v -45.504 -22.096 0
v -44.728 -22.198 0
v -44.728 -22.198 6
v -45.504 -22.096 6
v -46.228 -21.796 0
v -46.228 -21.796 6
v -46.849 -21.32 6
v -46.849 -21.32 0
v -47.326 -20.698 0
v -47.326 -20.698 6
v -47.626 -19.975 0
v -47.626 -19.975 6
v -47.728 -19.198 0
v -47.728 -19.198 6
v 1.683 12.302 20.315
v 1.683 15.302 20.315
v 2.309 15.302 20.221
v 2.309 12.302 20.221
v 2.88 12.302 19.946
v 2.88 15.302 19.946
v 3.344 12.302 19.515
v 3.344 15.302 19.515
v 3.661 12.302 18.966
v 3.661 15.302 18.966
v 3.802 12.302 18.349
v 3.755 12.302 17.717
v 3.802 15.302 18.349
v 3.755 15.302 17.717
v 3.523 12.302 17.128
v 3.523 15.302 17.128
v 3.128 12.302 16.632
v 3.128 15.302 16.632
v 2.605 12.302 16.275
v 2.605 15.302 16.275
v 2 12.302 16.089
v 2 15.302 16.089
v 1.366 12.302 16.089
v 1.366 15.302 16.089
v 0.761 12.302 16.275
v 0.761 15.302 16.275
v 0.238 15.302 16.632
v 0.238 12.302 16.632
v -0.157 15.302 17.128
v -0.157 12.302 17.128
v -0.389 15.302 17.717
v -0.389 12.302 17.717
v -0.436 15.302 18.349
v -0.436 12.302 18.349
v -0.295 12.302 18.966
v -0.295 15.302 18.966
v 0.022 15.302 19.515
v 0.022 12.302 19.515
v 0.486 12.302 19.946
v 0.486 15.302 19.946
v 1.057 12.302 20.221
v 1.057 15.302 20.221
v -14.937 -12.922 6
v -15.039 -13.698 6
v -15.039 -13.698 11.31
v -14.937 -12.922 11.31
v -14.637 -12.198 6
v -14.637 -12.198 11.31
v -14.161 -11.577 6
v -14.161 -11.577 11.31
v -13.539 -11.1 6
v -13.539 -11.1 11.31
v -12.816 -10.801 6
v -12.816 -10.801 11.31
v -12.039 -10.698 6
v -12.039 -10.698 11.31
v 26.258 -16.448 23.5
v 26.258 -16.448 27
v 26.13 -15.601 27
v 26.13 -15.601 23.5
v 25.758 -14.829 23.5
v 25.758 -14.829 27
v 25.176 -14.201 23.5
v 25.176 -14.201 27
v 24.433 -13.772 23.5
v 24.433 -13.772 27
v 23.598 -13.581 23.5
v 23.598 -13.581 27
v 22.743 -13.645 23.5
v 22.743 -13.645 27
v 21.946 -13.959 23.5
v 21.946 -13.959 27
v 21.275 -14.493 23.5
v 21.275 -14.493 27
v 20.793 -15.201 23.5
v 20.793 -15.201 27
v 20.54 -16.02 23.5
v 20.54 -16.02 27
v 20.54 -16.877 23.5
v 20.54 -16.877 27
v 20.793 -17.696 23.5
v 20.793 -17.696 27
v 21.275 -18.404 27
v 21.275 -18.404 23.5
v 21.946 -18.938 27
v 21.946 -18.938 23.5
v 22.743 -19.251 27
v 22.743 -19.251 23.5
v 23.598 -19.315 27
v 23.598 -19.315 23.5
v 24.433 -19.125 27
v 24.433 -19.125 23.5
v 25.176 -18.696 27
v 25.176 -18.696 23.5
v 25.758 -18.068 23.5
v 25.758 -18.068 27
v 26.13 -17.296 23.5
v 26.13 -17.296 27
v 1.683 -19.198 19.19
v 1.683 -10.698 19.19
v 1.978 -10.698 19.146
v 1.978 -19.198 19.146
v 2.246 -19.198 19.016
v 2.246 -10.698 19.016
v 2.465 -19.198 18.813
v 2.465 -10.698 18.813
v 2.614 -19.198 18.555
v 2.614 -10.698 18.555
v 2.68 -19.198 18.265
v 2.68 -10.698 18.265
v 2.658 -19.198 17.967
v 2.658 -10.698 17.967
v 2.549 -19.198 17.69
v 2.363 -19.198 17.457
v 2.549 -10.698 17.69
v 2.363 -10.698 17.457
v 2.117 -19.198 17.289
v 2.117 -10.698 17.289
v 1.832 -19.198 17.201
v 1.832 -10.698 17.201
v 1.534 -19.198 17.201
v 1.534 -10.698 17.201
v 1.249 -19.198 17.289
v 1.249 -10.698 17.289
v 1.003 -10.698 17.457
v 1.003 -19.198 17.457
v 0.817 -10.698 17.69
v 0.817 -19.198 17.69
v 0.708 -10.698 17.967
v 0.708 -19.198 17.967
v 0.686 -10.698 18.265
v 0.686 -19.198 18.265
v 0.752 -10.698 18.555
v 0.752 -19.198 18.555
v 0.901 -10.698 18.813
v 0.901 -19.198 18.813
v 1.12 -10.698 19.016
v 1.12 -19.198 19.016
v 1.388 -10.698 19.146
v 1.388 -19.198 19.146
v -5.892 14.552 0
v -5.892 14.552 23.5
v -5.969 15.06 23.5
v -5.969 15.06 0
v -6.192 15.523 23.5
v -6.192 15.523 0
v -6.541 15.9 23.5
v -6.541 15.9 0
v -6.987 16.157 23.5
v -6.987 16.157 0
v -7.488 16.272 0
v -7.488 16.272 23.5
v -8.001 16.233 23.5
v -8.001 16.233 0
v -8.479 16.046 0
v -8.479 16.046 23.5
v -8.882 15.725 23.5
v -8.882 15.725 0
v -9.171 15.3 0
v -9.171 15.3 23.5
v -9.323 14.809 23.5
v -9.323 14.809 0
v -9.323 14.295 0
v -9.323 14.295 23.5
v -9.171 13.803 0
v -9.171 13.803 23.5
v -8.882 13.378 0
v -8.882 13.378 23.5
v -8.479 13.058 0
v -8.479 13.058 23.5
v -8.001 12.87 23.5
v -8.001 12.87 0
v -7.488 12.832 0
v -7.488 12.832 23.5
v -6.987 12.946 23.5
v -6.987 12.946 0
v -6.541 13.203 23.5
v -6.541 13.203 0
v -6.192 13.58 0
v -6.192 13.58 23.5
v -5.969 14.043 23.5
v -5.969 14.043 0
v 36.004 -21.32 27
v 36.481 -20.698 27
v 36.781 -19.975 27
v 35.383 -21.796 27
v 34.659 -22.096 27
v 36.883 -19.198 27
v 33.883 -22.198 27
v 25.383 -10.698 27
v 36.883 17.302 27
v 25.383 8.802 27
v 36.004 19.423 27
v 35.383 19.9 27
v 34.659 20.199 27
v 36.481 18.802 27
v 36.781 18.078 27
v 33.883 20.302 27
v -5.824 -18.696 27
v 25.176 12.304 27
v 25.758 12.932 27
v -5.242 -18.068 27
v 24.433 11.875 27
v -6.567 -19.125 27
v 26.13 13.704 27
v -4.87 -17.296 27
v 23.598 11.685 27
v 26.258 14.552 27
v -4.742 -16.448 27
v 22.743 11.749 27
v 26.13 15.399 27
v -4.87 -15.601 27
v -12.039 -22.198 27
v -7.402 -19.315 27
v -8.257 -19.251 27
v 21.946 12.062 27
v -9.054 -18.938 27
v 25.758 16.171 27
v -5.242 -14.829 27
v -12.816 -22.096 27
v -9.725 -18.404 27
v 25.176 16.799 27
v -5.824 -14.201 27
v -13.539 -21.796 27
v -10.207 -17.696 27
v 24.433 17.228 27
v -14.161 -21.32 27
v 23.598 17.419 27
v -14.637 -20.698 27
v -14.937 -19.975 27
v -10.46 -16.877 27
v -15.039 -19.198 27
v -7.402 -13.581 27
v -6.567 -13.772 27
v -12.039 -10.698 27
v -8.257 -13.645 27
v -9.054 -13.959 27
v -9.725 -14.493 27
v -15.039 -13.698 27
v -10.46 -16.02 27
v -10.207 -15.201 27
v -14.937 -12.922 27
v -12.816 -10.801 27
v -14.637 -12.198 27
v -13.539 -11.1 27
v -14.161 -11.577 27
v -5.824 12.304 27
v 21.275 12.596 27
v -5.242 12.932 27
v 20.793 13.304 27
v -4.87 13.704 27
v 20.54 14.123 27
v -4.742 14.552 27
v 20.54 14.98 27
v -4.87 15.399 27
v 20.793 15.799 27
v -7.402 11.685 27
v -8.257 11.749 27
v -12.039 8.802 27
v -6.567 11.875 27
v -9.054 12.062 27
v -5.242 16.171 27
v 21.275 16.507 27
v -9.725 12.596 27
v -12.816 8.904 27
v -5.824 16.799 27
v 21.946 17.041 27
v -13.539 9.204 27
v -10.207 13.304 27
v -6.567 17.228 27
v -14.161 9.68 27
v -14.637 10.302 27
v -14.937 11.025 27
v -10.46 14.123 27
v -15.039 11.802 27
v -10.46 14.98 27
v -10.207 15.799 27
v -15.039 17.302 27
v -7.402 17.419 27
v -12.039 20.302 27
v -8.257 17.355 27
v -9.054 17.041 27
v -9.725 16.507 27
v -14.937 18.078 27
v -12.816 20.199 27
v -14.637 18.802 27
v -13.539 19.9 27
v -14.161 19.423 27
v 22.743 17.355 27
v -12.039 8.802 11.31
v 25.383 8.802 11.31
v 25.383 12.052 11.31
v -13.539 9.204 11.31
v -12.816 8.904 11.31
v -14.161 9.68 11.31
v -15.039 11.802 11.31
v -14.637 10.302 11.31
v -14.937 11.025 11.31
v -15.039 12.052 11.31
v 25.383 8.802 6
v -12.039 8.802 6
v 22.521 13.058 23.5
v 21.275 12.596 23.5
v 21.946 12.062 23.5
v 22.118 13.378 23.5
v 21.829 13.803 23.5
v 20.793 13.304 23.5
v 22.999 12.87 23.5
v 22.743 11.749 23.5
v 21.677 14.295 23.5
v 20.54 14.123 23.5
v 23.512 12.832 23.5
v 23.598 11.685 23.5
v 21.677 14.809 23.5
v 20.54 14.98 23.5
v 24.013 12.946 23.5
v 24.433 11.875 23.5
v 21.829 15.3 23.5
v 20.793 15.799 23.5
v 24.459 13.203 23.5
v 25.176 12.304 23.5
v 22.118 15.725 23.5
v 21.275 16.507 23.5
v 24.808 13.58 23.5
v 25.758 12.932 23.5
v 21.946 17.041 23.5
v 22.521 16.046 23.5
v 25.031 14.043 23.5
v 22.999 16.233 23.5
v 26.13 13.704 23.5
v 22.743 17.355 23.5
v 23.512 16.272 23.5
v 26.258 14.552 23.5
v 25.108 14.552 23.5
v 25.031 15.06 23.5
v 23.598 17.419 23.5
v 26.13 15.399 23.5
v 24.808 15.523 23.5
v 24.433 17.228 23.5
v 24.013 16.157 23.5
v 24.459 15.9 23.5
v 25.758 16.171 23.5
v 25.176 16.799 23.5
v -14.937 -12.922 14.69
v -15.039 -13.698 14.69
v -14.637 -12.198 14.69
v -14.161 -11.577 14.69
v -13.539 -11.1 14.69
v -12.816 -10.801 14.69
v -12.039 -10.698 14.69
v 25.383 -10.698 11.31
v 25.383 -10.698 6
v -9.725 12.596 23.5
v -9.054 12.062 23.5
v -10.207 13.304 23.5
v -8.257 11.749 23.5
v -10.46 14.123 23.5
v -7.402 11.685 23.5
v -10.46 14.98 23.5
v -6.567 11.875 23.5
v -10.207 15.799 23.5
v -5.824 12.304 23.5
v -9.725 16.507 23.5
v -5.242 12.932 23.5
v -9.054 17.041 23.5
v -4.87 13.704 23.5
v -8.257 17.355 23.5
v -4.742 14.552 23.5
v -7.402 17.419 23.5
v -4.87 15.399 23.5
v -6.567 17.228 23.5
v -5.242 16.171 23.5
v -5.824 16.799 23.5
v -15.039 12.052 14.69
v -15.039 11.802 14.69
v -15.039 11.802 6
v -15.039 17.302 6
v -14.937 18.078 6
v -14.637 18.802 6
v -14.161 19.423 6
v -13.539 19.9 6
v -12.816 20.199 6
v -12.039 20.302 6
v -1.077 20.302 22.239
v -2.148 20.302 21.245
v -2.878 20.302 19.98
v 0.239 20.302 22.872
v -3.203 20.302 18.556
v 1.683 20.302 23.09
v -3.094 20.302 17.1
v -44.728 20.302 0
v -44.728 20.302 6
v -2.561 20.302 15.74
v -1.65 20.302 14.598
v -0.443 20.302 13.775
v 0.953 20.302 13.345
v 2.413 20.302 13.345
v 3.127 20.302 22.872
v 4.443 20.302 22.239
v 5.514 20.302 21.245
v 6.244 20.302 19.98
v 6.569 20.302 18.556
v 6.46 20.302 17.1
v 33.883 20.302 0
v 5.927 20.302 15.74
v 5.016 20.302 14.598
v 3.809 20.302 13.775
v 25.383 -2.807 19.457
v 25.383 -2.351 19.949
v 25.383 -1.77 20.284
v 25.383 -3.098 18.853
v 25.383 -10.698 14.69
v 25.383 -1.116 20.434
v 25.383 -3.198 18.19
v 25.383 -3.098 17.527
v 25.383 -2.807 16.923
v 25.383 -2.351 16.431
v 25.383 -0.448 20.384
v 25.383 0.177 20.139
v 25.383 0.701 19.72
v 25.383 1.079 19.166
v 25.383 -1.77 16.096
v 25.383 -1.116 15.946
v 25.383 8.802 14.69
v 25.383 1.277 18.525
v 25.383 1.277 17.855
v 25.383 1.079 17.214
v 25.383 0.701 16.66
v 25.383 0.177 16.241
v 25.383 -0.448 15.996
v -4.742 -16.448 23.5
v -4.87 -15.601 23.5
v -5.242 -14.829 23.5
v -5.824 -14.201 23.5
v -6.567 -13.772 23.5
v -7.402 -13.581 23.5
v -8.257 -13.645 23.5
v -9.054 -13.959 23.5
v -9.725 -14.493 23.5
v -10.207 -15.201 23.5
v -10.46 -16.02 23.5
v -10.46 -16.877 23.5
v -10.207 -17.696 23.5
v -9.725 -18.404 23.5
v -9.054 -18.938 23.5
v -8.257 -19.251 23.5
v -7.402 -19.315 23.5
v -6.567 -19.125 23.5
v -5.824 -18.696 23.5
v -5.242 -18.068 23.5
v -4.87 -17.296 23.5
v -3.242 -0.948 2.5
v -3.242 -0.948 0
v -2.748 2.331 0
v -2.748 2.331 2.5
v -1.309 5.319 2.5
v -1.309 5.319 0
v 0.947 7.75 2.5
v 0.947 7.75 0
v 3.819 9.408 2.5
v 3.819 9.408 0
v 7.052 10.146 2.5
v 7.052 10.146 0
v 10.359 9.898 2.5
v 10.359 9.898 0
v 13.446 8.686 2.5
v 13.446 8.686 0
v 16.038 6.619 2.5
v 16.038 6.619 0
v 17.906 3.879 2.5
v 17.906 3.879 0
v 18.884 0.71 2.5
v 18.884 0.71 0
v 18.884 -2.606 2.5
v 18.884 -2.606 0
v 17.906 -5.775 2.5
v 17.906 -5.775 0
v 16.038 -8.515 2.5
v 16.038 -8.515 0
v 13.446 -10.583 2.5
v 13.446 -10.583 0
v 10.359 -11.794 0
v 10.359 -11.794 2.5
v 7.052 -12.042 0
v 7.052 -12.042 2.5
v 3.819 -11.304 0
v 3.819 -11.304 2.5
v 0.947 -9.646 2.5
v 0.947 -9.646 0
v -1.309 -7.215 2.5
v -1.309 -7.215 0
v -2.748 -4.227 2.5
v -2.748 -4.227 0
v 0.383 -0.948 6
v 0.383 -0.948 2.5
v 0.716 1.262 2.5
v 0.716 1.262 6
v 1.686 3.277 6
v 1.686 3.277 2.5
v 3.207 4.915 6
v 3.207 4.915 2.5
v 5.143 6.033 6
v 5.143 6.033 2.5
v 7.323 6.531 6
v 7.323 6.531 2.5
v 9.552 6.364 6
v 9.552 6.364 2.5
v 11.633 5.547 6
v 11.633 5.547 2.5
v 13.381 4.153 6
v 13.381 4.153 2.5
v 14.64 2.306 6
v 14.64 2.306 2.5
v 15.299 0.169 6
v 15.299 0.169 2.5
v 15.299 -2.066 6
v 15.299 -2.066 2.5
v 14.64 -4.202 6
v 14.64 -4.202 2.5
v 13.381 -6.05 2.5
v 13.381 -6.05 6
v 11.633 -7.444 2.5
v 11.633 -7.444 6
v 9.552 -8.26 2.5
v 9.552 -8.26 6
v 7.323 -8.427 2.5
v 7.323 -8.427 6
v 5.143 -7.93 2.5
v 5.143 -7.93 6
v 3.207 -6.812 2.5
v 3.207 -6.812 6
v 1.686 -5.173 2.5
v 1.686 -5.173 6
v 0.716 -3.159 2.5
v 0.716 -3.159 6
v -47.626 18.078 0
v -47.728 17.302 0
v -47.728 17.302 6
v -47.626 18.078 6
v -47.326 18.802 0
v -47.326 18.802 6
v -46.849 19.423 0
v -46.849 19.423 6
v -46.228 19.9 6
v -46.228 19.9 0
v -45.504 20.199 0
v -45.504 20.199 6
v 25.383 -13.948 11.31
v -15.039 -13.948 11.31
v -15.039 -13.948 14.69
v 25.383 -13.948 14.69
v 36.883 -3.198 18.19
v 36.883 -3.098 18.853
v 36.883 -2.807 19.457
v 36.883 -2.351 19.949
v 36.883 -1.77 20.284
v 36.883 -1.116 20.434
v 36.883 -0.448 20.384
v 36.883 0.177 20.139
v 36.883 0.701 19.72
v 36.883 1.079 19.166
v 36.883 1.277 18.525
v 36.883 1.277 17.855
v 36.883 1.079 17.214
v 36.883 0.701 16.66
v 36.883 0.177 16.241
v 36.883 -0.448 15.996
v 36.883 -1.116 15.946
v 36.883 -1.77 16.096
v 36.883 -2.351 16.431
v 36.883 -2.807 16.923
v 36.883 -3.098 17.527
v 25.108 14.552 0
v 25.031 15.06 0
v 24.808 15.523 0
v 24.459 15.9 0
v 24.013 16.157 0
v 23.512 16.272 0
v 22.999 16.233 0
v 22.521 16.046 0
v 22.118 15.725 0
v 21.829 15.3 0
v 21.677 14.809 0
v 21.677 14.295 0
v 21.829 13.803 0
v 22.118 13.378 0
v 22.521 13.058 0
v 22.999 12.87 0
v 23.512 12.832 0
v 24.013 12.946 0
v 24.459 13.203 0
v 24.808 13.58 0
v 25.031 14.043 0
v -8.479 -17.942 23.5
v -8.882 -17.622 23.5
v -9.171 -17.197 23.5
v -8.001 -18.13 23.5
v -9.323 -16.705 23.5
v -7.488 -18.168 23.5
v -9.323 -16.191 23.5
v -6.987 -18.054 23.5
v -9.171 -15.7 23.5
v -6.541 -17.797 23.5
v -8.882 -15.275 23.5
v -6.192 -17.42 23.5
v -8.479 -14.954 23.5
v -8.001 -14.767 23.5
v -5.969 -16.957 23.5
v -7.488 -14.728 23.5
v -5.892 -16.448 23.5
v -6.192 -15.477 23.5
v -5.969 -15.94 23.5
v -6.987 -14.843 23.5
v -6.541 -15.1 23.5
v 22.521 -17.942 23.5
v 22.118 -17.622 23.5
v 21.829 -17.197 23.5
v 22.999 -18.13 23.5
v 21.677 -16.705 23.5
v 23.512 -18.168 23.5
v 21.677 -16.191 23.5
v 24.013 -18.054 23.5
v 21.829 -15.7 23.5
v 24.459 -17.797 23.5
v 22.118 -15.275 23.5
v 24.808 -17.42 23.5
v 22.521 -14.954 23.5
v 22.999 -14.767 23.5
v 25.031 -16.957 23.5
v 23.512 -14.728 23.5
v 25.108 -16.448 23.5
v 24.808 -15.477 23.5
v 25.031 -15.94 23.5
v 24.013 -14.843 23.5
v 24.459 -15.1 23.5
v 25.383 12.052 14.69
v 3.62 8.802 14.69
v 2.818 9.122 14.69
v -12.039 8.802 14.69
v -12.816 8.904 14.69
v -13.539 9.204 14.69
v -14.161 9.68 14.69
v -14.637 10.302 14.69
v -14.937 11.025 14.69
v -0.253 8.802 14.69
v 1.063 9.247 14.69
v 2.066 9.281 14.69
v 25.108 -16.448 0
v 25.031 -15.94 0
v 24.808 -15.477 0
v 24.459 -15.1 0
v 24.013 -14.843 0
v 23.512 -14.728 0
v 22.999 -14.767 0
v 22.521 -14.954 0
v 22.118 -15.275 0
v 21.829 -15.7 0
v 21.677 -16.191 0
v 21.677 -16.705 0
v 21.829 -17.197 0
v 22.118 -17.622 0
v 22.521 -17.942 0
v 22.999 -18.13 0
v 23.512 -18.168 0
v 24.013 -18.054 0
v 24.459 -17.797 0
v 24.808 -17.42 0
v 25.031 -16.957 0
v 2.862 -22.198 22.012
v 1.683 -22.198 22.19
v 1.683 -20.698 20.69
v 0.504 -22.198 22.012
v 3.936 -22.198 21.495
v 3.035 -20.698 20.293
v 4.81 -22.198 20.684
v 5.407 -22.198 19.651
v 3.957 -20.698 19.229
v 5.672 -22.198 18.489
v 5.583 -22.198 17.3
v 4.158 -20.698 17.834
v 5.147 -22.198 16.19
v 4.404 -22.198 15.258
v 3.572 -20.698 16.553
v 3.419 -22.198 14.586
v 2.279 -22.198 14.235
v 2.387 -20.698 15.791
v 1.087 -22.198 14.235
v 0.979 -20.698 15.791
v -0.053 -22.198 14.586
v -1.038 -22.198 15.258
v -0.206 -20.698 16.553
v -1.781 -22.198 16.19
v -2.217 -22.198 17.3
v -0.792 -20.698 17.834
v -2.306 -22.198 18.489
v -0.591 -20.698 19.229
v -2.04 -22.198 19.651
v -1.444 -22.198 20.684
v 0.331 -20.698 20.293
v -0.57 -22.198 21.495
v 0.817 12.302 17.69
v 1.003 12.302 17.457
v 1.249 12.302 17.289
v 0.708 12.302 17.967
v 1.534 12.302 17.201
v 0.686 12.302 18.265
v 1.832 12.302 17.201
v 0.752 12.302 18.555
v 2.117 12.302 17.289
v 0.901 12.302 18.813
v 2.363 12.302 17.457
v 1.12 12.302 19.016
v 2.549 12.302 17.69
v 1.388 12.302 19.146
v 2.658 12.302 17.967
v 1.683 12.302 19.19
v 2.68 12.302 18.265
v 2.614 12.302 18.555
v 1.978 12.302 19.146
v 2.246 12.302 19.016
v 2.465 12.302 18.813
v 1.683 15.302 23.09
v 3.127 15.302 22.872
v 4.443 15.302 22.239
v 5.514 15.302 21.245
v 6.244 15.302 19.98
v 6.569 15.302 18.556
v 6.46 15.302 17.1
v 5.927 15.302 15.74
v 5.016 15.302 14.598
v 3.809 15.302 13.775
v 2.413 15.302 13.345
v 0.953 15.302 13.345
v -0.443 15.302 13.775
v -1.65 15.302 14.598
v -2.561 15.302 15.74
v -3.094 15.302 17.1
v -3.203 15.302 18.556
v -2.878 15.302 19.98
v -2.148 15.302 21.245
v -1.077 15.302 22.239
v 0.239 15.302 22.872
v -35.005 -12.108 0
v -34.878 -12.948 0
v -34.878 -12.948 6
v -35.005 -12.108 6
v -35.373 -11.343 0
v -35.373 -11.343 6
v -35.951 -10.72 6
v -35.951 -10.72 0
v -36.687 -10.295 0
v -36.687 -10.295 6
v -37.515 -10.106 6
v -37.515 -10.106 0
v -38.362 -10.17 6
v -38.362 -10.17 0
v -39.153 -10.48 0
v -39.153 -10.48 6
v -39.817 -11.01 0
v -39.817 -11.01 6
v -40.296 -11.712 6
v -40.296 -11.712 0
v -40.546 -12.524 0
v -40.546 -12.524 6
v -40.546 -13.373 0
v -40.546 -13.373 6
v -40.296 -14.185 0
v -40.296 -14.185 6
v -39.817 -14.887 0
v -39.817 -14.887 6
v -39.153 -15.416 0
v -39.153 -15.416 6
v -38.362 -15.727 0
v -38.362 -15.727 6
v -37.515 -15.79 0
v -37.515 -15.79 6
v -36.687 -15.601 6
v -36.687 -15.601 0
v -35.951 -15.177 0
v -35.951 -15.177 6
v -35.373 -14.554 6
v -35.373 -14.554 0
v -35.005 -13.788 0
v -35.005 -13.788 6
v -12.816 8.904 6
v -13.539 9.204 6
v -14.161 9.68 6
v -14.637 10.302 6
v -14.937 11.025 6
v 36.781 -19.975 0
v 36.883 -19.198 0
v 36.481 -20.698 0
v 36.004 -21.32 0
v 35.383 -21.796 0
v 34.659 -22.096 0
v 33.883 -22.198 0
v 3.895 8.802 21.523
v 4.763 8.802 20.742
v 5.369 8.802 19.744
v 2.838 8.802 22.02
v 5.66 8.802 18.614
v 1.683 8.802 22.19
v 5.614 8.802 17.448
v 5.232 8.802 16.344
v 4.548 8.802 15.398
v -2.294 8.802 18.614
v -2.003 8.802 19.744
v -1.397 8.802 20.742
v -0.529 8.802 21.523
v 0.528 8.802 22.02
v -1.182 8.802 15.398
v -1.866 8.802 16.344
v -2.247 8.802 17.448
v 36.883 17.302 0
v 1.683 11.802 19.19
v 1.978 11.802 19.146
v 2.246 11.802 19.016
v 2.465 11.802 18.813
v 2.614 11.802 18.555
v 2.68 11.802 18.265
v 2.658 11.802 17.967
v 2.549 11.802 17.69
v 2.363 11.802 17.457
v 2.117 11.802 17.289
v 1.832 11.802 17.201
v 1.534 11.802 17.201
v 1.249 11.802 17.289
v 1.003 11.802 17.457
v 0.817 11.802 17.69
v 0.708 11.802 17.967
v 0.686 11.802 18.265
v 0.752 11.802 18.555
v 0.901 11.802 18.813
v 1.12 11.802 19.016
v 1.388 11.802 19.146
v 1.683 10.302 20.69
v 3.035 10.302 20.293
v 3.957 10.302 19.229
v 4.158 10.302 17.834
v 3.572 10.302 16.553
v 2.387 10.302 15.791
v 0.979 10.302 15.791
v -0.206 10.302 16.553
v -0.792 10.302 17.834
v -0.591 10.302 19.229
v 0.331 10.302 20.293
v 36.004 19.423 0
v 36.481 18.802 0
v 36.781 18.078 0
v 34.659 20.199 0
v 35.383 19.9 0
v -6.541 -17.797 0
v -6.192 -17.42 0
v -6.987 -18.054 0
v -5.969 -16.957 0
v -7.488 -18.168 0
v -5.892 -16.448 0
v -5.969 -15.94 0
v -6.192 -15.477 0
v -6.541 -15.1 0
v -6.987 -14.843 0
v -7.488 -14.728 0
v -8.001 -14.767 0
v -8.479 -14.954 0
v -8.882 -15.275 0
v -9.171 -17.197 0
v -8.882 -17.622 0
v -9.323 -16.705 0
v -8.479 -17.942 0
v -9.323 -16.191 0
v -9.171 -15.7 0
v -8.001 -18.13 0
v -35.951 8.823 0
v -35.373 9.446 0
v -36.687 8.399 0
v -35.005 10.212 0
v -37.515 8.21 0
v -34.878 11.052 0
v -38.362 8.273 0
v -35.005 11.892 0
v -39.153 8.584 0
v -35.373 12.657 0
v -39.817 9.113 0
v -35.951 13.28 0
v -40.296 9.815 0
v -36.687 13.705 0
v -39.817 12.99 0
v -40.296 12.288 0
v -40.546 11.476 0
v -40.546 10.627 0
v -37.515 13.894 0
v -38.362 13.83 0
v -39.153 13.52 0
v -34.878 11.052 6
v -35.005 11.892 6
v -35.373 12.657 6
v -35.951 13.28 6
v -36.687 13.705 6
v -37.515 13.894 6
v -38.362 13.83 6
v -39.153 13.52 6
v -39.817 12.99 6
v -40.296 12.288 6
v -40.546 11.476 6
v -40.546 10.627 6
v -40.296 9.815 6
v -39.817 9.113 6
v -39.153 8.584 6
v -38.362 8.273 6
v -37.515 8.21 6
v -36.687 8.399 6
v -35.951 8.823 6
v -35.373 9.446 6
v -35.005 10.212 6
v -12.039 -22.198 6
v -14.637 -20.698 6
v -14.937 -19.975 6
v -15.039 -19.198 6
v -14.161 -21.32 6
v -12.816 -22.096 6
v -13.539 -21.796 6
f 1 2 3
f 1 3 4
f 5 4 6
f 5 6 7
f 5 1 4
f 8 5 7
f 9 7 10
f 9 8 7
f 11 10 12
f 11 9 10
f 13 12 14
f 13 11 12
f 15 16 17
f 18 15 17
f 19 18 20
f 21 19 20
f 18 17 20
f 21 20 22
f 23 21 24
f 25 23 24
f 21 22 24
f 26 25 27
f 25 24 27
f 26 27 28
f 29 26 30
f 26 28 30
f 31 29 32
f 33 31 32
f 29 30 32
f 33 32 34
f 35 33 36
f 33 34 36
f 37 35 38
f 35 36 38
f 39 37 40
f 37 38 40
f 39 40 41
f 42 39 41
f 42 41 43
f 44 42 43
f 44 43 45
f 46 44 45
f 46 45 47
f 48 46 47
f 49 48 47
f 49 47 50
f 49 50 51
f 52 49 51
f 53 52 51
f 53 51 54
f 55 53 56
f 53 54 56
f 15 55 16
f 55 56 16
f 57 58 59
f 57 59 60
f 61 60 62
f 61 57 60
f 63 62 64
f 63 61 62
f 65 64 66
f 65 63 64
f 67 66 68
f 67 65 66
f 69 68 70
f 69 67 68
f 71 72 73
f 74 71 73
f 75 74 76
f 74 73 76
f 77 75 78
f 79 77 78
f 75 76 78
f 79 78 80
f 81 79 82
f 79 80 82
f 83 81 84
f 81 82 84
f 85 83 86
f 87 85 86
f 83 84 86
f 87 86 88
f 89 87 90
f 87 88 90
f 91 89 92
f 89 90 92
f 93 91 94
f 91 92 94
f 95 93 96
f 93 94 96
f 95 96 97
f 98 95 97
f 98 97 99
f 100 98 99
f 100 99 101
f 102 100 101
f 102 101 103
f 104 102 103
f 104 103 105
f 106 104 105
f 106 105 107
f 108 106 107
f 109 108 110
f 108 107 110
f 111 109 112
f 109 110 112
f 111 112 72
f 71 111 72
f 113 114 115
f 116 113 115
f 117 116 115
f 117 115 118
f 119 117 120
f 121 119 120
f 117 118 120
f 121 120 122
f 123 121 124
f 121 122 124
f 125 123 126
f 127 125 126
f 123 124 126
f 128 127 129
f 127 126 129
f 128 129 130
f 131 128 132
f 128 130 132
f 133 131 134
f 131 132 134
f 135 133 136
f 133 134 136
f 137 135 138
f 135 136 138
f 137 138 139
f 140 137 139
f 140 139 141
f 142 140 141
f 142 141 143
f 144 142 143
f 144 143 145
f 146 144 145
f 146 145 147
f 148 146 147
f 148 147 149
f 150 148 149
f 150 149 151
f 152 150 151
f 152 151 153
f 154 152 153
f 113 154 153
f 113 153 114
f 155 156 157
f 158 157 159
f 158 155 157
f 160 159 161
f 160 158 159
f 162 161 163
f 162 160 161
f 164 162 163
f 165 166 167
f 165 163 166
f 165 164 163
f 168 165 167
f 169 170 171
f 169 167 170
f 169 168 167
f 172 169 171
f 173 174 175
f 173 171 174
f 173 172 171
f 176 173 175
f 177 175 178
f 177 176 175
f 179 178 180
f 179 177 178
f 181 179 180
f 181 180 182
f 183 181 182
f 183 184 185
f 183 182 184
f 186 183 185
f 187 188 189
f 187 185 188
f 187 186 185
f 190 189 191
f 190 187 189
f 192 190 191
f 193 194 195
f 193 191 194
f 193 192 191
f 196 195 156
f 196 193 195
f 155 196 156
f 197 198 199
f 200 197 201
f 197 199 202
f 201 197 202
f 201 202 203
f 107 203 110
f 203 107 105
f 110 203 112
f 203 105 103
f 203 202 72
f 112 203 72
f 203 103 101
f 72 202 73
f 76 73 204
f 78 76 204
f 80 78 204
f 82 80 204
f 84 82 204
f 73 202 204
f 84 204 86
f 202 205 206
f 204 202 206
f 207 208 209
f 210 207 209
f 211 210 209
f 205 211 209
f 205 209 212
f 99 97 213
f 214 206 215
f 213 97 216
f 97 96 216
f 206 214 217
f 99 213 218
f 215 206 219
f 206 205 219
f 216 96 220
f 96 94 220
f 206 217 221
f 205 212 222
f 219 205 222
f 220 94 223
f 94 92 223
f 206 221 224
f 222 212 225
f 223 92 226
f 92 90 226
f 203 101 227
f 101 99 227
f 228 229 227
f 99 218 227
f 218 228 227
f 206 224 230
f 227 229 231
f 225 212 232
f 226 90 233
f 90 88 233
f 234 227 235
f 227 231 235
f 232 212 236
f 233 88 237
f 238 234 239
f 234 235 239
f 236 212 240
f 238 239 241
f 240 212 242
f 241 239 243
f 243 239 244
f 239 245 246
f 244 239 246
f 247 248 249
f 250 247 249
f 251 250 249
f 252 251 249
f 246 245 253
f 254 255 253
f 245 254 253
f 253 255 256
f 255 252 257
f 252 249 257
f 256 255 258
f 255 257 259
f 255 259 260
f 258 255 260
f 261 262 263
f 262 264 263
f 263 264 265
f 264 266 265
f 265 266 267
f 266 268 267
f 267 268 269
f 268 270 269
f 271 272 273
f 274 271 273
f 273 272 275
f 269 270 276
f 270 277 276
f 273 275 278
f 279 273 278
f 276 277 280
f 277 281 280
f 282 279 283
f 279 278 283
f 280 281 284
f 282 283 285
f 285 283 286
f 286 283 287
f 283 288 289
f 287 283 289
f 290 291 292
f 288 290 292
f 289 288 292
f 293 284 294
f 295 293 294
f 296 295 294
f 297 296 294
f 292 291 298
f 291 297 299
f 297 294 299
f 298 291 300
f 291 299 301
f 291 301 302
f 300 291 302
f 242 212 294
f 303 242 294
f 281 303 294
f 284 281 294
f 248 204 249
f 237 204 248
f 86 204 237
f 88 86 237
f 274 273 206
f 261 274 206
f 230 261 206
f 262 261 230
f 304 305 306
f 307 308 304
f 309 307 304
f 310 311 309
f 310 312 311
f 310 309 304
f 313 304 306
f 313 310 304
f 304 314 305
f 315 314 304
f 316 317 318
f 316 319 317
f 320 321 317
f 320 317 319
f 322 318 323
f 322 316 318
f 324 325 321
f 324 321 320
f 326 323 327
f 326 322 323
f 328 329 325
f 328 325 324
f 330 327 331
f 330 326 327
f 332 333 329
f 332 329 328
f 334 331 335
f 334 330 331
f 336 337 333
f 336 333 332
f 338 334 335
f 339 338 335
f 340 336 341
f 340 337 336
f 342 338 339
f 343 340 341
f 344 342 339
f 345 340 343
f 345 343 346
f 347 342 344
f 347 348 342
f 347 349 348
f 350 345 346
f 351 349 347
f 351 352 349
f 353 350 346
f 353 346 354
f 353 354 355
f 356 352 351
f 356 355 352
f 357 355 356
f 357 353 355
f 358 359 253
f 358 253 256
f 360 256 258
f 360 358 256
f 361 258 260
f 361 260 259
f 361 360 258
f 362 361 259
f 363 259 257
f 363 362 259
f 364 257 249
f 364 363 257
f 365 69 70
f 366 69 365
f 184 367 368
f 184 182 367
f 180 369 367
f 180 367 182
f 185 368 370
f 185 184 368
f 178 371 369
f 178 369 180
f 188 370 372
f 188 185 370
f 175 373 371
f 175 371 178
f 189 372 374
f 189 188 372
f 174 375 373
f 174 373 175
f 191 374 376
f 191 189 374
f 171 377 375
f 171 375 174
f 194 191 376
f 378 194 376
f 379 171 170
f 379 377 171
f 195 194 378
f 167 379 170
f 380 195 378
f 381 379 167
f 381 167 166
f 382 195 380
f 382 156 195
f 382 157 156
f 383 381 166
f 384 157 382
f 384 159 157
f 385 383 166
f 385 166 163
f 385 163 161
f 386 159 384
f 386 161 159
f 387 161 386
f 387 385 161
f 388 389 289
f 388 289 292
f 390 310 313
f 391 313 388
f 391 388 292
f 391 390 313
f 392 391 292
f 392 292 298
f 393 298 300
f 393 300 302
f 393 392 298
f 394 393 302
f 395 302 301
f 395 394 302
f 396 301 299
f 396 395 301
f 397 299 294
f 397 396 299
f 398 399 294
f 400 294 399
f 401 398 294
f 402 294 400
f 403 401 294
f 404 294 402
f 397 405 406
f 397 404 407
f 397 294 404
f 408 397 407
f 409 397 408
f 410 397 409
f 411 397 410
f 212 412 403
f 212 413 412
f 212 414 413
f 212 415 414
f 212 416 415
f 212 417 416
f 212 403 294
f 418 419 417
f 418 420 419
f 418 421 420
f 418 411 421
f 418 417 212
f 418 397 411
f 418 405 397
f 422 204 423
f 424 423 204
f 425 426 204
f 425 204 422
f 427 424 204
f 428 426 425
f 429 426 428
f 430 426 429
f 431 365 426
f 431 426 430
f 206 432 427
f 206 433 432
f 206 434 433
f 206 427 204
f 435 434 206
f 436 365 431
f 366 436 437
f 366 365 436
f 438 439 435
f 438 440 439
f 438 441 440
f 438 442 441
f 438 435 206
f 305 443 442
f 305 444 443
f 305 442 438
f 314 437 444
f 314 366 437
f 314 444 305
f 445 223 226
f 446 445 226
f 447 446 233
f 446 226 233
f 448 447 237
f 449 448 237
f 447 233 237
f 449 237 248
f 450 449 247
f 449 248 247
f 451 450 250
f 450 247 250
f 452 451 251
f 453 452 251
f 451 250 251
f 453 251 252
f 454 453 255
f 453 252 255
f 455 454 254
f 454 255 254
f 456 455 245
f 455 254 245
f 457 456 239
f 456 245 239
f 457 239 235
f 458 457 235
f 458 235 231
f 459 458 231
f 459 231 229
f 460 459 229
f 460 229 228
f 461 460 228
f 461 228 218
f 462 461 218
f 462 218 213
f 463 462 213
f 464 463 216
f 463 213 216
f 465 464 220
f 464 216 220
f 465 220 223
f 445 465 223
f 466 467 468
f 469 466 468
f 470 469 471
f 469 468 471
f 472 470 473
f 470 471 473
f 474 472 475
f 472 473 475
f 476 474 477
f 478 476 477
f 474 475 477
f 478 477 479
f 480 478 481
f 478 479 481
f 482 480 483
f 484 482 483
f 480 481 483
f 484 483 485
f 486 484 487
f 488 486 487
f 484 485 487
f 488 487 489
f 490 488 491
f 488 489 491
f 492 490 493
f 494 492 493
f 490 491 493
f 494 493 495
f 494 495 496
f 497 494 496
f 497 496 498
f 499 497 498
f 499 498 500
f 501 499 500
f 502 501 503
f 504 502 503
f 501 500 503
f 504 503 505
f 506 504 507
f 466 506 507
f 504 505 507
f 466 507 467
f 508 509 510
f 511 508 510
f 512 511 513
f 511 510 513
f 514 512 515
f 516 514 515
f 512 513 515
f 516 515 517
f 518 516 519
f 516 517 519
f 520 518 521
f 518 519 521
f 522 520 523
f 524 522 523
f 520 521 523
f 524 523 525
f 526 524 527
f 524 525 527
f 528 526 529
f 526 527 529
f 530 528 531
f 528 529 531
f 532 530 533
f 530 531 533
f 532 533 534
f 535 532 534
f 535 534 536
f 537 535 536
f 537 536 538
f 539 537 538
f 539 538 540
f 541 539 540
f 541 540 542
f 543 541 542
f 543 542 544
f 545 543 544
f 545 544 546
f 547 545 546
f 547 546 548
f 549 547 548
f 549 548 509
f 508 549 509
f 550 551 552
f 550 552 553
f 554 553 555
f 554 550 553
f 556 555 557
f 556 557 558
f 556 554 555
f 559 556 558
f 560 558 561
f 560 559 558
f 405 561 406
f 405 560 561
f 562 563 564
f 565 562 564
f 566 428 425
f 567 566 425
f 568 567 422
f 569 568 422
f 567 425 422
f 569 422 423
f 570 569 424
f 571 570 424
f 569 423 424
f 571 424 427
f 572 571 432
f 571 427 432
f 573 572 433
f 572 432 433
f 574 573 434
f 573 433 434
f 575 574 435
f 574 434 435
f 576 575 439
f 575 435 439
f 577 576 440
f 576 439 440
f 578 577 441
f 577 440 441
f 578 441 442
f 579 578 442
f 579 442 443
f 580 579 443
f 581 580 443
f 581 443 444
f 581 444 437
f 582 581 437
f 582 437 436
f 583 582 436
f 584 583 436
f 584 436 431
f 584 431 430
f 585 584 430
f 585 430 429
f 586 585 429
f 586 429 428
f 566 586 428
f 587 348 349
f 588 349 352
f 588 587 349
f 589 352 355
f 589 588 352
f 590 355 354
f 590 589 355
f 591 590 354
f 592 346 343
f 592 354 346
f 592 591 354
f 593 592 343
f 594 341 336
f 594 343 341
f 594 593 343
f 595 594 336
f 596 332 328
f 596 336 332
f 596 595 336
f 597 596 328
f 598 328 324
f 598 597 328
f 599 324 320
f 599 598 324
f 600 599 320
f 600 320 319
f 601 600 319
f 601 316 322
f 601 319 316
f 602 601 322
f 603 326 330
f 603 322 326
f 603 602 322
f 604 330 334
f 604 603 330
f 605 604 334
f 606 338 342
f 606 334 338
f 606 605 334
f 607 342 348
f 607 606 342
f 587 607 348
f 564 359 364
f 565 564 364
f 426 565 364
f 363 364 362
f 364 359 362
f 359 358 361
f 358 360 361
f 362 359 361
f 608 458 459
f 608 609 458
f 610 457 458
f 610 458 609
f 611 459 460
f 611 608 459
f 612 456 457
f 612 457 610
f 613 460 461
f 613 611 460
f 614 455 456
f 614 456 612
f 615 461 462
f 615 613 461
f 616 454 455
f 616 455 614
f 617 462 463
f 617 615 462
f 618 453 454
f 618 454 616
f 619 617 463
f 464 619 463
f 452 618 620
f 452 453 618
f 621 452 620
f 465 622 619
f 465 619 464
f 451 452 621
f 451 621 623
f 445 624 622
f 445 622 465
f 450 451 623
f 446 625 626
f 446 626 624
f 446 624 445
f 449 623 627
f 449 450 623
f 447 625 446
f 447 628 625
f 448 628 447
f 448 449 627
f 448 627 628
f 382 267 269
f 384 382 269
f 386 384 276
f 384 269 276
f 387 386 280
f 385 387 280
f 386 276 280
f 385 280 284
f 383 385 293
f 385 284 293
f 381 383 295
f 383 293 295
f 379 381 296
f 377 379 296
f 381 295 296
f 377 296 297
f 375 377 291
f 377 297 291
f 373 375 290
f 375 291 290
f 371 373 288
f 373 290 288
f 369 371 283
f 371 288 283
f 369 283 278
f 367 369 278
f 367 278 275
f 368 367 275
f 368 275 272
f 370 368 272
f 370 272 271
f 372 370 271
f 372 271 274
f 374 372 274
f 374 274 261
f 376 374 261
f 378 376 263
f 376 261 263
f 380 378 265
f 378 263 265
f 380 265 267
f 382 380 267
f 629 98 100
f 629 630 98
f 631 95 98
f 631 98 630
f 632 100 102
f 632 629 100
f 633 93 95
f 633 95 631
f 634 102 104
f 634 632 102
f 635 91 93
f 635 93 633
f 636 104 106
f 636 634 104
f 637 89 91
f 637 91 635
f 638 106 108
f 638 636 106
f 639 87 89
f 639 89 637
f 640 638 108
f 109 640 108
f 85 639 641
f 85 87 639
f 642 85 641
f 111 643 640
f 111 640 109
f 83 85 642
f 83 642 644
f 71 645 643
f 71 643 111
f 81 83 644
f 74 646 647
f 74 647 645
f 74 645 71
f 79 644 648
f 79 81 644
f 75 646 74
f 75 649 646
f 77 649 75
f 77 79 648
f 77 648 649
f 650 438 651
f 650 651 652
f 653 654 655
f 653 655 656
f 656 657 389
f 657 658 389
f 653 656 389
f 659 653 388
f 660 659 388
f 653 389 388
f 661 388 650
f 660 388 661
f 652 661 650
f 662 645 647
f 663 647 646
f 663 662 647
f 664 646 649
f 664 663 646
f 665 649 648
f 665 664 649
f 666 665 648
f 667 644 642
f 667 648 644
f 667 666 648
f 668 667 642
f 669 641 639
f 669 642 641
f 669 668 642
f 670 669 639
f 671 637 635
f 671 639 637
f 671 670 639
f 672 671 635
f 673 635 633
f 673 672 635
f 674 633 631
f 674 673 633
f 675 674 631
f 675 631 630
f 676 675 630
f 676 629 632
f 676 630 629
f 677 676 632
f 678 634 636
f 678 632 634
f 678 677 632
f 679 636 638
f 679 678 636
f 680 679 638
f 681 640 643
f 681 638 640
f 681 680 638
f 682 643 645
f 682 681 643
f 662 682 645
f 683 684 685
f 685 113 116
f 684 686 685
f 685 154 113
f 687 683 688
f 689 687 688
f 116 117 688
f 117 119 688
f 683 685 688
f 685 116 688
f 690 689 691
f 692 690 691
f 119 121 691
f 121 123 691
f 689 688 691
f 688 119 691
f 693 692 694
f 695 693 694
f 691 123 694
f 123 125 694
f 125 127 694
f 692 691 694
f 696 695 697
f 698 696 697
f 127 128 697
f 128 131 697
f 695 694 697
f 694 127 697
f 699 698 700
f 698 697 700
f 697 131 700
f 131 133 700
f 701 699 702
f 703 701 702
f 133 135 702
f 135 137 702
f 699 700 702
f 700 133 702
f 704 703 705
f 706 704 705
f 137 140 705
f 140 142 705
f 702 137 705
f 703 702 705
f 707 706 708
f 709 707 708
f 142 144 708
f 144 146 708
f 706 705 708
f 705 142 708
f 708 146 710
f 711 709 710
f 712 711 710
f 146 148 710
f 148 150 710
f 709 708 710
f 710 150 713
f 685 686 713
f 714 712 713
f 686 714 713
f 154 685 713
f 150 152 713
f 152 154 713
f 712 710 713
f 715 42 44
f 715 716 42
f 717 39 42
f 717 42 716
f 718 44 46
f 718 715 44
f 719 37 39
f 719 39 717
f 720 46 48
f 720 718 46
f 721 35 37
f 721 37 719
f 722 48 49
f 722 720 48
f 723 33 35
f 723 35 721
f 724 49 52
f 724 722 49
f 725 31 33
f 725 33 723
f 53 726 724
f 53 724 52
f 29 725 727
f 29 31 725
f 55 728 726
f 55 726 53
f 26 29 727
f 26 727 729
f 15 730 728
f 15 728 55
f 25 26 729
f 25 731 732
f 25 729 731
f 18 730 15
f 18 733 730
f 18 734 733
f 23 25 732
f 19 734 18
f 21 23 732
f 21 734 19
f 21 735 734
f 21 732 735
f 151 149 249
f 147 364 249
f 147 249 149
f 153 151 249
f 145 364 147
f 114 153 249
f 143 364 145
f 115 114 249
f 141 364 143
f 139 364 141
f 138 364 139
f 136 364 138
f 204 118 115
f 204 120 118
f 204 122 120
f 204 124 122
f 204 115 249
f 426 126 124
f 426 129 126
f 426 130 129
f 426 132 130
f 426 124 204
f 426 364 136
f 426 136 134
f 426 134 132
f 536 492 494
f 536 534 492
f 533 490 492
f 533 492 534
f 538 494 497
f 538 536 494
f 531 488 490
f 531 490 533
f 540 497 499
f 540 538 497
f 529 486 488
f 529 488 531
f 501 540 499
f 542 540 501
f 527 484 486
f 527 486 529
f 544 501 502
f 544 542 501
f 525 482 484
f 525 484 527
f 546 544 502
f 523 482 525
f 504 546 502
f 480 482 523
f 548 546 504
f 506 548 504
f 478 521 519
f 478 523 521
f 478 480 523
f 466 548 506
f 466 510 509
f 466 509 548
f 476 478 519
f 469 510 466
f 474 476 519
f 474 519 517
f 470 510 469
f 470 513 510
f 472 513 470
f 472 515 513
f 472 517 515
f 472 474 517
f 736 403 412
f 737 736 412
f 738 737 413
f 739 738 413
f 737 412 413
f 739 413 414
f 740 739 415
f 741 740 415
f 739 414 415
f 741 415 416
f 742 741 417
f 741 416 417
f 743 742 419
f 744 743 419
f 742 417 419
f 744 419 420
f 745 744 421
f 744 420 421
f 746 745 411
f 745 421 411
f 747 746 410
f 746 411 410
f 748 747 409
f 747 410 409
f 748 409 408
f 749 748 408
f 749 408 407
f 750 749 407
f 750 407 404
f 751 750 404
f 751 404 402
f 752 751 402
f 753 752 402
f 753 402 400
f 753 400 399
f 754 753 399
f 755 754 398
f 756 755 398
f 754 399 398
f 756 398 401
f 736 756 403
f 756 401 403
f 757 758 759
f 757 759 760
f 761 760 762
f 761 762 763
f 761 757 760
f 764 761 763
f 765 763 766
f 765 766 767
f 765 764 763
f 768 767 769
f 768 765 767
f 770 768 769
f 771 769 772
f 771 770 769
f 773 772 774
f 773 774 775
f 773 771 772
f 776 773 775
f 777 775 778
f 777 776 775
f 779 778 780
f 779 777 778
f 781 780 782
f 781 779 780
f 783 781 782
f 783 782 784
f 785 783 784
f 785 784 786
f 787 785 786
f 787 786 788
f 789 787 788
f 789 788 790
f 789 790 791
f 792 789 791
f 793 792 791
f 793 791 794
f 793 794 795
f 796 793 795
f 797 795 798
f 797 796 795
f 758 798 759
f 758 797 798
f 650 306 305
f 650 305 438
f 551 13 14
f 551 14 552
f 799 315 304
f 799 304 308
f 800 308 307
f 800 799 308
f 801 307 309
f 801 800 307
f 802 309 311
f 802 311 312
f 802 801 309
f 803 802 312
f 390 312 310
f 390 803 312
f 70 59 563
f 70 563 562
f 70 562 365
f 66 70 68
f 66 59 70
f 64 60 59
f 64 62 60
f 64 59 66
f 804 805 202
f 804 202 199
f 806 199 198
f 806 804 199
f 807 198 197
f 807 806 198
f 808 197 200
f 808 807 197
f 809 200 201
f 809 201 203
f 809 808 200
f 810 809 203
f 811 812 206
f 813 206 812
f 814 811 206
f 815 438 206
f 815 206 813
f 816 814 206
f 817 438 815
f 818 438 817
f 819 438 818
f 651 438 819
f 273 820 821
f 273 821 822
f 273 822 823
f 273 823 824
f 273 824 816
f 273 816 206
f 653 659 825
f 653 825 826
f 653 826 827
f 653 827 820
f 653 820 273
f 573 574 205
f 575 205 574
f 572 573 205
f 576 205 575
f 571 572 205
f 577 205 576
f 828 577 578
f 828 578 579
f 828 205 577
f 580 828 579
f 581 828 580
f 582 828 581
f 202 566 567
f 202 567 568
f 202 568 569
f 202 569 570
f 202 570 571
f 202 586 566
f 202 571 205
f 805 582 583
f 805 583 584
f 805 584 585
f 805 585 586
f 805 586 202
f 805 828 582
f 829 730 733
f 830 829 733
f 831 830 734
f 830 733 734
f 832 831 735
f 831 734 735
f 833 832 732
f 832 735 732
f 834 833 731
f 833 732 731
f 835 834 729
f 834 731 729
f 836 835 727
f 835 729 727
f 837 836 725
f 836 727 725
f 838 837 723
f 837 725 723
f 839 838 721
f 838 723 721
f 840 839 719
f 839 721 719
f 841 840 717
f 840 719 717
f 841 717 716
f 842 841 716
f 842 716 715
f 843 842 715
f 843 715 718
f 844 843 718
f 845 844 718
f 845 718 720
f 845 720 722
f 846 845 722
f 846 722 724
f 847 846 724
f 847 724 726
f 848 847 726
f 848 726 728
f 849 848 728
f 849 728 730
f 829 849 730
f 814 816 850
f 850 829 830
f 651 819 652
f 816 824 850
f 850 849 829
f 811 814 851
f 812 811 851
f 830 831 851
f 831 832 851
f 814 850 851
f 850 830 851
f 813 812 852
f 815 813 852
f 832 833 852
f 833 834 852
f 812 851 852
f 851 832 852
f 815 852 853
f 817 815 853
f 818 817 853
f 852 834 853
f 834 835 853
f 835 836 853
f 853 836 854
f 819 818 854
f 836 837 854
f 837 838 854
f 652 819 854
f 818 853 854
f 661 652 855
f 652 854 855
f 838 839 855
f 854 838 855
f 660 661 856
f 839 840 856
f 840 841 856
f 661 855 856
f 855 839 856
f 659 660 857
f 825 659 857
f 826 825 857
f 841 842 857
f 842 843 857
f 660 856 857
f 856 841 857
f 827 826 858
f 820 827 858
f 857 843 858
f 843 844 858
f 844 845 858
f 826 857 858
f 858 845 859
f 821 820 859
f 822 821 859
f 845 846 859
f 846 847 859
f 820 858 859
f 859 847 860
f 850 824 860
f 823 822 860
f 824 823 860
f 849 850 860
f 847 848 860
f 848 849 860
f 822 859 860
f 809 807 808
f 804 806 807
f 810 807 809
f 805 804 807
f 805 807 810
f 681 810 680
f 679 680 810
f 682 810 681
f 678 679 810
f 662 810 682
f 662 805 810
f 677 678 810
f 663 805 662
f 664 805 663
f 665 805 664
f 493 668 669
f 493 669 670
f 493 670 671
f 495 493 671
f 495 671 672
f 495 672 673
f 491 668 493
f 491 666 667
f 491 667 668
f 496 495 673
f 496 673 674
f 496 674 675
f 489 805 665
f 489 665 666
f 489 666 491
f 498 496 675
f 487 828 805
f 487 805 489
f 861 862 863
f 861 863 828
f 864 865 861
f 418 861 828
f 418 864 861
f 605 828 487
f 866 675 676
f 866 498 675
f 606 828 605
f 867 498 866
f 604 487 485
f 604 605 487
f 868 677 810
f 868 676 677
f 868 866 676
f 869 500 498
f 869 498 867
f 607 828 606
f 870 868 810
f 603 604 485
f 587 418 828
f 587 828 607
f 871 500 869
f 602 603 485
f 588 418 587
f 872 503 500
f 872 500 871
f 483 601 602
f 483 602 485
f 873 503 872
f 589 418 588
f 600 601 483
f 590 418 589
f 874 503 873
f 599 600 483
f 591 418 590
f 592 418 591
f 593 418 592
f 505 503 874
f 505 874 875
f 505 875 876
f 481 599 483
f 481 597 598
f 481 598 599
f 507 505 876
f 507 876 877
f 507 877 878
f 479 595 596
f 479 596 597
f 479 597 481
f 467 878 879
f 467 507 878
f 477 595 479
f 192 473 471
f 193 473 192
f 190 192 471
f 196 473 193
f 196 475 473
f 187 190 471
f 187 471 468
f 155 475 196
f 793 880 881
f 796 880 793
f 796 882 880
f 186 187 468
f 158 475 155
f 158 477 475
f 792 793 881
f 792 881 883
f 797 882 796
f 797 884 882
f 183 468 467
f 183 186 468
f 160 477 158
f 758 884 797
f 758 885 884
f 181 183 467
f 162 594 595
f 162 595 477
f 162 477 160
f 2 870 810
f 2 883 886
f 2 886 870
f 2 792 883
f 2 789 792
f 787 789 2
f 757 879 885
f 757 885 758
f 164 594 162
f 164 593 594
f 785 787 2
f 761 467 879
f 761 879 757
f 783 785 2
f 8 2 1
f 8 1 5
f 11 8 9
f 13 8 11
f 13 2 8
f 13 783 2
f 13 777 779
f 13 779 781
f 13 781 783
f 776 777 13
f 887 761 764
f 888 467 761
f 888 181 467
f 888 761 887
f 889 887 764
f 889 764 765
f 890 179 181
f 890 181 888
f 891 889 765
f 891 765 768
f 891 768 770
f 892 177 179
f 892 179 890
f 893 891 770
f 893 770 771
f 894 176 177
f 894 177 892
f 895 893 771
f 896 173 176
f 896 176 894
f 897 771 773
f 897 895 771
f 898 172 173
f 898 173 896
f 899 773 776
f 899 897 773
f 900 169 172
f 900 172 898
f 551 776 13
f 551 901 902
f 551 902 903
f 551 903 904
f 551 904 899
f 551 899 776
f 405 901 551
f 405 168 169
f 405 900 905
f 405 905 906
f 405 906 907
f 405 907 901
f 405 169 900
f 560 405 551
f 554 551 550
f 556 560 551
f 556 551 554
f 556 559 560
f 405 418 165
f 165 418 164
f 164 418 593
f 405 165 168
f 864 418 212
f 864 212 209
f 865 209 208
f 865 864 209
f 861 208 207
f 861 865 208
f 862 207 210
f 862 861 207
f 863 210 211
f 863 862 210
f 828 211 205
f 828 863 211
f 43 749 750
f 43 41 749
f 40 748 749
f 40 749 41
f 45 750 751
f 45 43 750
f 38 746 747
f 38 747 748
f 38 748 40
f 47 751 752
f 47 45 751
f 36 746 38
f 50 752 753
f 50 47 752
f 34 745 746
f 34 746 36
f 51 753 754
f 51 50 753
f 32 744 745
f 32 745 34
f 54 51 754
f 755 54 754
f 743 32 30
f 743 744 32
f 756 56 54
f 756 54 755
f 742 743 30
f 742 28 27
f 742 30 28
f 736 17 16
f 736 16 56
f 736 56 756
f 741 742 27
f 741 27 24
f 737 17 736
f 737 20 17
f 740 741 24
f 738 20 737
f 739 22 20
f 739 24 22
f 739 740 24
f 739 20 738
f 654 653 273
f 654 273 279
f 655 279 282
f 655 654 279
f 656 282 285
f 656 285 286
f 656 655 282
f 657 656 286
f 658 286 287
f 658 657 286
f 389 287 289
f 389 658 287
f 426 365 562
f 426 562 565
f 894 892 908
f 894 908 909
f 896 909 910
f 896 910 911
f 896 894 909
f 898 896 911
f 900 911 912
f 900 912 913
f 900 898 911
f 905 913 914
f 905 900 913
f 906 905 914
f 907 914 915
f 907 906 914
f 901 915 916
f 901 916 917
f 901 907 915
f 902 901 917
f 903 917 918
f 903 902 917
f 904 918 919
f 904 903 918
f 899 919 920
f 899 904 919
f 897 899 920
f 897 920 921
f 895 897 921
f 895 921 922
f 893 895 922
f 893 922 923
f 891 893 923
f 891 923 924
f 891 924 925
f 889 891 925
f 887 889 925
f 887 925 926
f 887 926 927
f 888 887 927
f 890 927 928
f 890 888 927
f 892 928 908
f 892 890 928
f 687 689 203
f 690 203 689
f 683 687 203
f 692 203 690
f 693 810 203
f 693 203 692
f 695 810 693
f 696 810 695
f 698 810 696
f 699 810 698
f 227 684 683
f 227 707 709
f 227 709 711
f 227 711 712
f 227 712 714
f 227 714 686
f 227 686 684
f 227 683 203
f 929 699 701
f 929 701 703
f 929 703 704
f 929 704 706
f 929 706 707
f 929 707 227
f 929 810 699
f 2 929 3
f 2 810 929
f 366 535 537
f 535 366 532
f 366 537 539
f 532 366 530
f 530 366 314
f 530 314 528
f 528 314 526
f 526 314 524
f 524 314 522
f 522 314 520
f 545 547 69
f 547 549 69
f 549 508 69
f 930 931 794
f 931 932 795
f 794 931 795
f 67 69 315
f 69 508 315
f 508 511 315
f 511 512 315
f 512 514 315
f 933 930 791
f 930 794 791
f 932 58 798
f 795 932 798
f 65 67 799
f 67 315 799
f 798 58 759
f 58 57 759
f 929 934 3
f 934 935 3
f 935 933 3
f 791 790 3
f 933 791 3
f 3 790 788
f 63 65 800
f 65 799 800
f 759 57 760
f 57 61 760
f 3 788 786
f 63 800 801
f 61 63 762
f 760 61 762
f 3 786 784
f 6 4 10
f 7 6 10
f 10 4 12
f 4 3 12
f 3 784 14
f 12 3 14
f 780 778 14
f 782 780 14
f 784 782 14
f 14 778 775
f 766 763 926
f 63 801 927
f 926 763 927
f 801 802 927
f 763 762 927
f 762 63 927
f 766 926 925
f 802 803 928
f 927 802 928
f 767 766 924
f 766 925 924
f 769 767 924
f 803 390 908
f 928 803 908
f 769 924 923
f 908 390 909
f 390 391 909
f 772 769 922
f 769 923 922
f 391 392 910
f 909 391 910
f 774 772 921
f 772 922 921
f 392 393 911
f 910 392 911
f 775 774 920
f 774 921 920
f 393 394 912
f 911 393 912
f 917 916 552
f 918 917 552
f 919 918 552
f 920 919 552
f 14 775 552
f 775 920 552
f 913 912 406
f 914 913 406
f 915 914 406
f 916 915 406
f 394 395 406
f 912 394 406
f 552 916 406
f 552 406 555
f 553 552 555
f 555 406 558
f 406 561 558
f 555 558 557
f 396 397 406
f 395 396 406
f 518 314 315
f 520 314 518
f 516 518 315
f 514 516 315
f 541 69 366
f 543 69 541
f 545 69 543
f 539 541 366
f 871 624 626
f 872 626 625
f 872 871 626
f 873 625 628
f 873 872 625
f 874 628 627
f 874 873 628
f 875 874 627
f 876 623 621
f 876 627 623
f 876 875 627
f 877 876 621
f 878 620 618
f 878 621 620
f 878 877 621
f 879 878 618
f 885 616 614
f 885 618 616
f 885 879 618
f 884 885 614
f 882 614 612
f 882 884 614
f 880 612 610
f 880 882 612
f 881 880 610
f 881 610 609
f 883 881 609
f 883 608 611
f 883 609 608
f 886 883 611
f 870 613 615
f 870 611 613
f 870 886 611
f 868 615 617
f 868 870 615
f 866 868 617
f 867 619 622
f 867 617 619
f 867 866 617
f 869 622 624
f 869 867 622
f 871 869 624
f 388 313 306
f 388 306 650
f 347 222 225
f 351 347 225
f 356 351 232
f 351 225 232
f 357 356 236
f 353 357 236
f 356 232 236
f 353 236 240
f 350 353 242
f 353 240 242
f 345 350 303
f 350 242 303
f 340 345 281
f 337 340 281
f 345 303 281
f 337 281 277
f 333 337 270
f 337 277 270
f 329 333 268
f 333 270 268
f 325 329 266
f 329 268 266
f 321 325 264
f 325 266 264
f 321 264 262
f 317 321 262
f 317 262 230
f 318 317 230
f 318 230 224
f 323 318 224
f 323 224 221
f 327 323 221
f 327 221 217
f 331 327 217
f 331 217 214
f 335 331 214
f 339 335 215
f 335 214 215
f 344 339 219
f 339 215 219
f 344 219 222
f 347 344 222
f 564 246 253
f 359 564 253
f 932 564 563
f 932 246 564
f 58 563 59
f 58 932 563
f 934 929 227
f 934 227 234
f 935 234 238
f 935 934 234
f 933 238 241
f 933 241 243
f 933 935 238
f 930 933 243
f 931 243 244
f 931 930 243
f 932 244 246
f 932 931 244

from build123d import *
from build123d.topology import SkipClean

# Parameters (mm, degrees)
SKETCH1_R           = 2.850000007
SKETCH1_R_2         = 1.725
BOSS_EXTRUDE1_DEPTH = 6
SKETCH7_R           = 11.125
CUT_EXTRUDE4_DEPTH  = 2.5
SKETCH8_R           = 7.5
CUT_EXTRUDE5_DEPTH  = 6
SKETCH10_R          = 1.725
BOSS_EXTRUDE4_DEPTH = 21
SKETCH11_W          = 3.38
SKETCH11_H          = 26
CUT_EXTRUDE6_DEPTH  = 40.422308
SKETCH14_R          = 1
CUT_EXTRUDE7_DEPTH  = 70.377273429
CHAMFER1_SIZE       = 3
SKETCH19_R          = 4.9
SKETCH19_R_2        = 1
CUT_EXTRUDE9_DEPTH  = 5
SKETCH20_R          = 2.125
CUT_EXTRUDE10_DEPTH = 3
SKETCH21_R          = 2.875
CUT_EXTRUDE11_DEPTH = 3.5
SKETCH22_R          = 2.25
CUT_EXTRUDE12_DEPTH = 82.036885127
CHAMFER5_SIZE       = 3


with BuildPart() as part:
    # Sketch1 → Boss-Extrude1 (new body)
    with BuildSketch(Plane.XY):
        with BuildLine():
            Line((-44.727938028, 20.301676915), (33.883013294, 20.301676915))
            ThreePointArc((33.883013294, 20.301676915), (36.004333638, 19.422997259), (36.883013294, 17.301676915))
            Line((36.883013294, 17.301676915), (36.883013294, -19.198323085))
            ThreePointArc((36.883013294, -19.198323085), (36.004333638, -21.319643428), (33.883013294, -22.198323085))
            Line((33.883013294, -22.198323085), (-44.727938028, -22.198323085))
            ThreePointArc((-44.727938028, -22.198323085), (-46.849258372, -21.319643428), (-47.727938028, -19.198323085))
            Line((-47.727938028, -19.198323085), (-47.727938028, 17.301676915))
            ThreePointArc((-47.727938028, 17.301676915), (-46.849258372, 19.422997259), (-44.727938028, 20.301676915))
        make_face()
        with Locations((-37.727938028, 11.051676915)):
            Circle(SKETCH1_R, mode=Mode.SUBTRACT)
        with Locations((-37.727938028, -12.948323085)):
            Circle(SKETCH1_R, mode=Mode.SUBTRACT)
        with Locations((-7.616986706, 14.551676915)):
            Circle(SKETCH1_R_2, mode=Mode.SUBTRACT)
        with Locations((-7.616986706, -16.448323085)):
            Circle(SKETCH1_R_2, mode=Mode.SUBTRACT)
        with Locations((23.383013294, -16.448323085)):
            Circle(SKETCH1_R_2, mode=Mode.SUBTRACT)
        with Locations((23.383013294, 14.551676915)):
            Circle(SKETCH1_R_2, mode=Mode.SUBTRACT)
    extrude(amount=BOSS_EXTRUDE1_DEPTH)

    # Sketch7 → Cut-Extrude4 (cut)
    with BuildSketch(Plane(origin=(0, 0, 0), x_dir=(-1, 0, 0), z_dir=(0, 0, -1))):
        with Locations((-7.883013294, -0.948323085)):
            Circle(SKETCH7_R)
    extrude(amount=-CUT_EXTRUDE4_DEPTH, mode=Mode.SUBTRACT)

    # Sketch8 → Cut-Extrude5 (cut)
    with BuildSketch(Plane(origin=(0, 0, 0), x_dir=(-1, 0, 0), z_dir=(0, 0, -1))):
        with Locations((-7.883013294, -0.948323085)):
            Circle(SKETCH8_R)
    extrude(amount=-CUT_EXTRUDE5_DEPTH, mode=Mode.SUBTRACT)

    # Sketch10 → Boss-Extrude4 (add)
    with BuildSketch(Plane.XY.offset(6)):
        with BuildLine():
            Line((-12.039294537, 20.301676915), (33.883013294, 20.301676915))
            ThreePointArc((33.883013294, 20.301676915), (36.004333638, 19.422997259), (36.883013294, 17.301676915))
            Line((36.883013294, 17.301676915), (36.883013294, -19.198323085))
            ThreePointArc((36.883013294, -19.198323085), (36.004333638, -21.319643428), (33.883013294, -22.198323085))
            Line((33.883013294, -22.198323085), (-12.039294537, -22.198323085))
            ThreePointArc((-12.039294537, -22.198323085), (-14.160614881, -21.319643428), (-15.039294537, -19.198323085))
            Line((-15.039294537, -19.198323085), (-15.039294537, -13.698323085))
            ThreePointArc((-15.039294537, -13.698323085), (-14.160614881, -11.577002741), (-12.039294537, -10.698323085))
            Line((-12.039294537, -10.698323085), (25.383013294, -10.698323085))
            Line((25.383013294, -10.698323085), (25.383013294, 8.801676915))
            Line((25.383013294, 8.801676915), (-12.039294537, 8.801676915))
            ThreePointArc((-12.039294537, 8.801676915), (-14.160614881, 9.680356572), (-15.039294537, 11.801676915))
            Line((-15.039294537, 11.801676915), (-15.039294537, 17.301676915))
            ThreePointArc((-15.039294537, 17.301676915), (-14.160614881, 19.422997259), (-12.039294537, 20.301676915))
        make_face()
        with Locations((-7.616986706, 14.551676915)):
            Circle(SKETCH10_R, mode=Mode.SUBTRACT)
        with Locations((23.383013294, 14.551676915)):
            Circle(SKETCH10_R, mode=Mode.SUBTRACT)
        with Locations((-7.616986706, -16.448323085)):
            Circle(SKETCH10_R, mode=Mode.SUBTRACT)
        with Locations((23.383013294, -16.448323085)):
            Circle(SKETCH10_R, mode=Mode.SUBTRACT)
    extrude(amount=BOSS_EXTRUDE4_DEPTH)

    # Sketch11 → Cut-Extrude6 (cut)
    with SkipClean():  # the faces are left unmerged after this step: merging them gives an invalid solid
        with BuildSketch(Plane.ZY.offset(15.039294537)):
            with Locations((13, -0.948323085)):
                Rectangle(SKETCH11_W, SKETCH11_H)
        extrude(amount=-CUT_EXTRUDE6_DEPTH, mode=Mode.SUBTRACT)

    # Sketch14 → Cut-Extrude7 (cut, through all)
    with SkipClean():  # the faces are left unmerged after this step: merging them gives an invalid solid
        with BuildSketch(Plane(origin=(0, 20.301676915, 0), x_dir=(1, 0, 0), z_dir=(0, 1, 0))):
            with Locations(Location((1.683013294, -18.19, 0), (0, 0, 270))):
                Circle(SKETCH14_R)
        extrude(amount=-CUT_EXTRUDE7_DEPTH, mode=Mode.SUBTRACT)

    # Chamfer1
    chamfer1_edges = [part.edges().sort_by_distance(p)[0] for p in [
        (1.683013294, -22.198323085, 17.19),
    ]]
    chamfer(chamfer1_edges, length=CHAMFER1_SIZE)

    # Sketch19 → Cut-Extrude9 (cut)
    with SkipClean():  # the faces are left unmerged after this step: merging them gives an invalid solid
        with BuildSketch(Plane(origin=(0, 20.301676915, 0), x_dir=(1, 0, 0), z_dir=(0, 1, 0))):
            with Locations(Location((1.683013294, -18.19, 0), (0, 0, 270))):
                Circle(SKETCH19_R)
            with Locations(Location((1.683013294, -18.19, 0), (0, 0, 270))):
                Circle(SKETCH19_R_2, mode=Mode.SUBTRACT)
        extrude(amount=-CUT_EXTRUDE9_DEPTH, mode=Mode.SUBTRACT)

    # Sketch20 → Cut-Extrude10 (cut)
    with SkipClean():  # the faces are left unmerged after this step: merging them gives an invalid solid
        with BuildSketch(Plane(origin=(0, 15.301676915, 0), x_dir=(1, 0, 0), z_dir=(0, 1, 0))):
            with Locations(Location((1.683013294, -18.19, 0), (0, 0, 270))):
                Circle(SKETCH20_R)
        extrude(amount=-CUT_EXTRUDE10_DEPTH, mode=Mode.SUBTRACT)

    # Sketch21 → Cut-Extrude11 (cut)
    with SkipClean():  # the faces are left unmerged after this step: merging them gives an invalid solid
        with BuildSketch(Plane.XY.offset(27)):
            with Locations((23.383013294, 14.551676915)):
                Circle(SKETCH21_R)
            with Locations((23.383013294, -16.448323085)):
                Circle(SKETCH21_R)
            with Locations((-7.616986706, -16.448323085)):
                Circle(SKETCH21_R)
            with Locations((-7.616986706, 14.551676915)):
                Circle(SKETCH21_R)
        extrude(amount=-CUT_EXTRUDE11_DEPTH, mode=Mode.SUBTRACT)

    # Sketch22 → Cut-Extrude12 (cut, through all)
    with SkipClean():  # the faces are left unmerged after this step: merging them gives an invalid solid
        with BuildSketch(Plane.ZY.offset(-25.383013294)):
            with Locations(Location((18.19, -0.948323085, 0), (0, 0, 270))):
                Circle(SKETCH22_R)
        extrude(amount=-CUT_EXTRUDE12_DEPTH, mode=Mode.SUBTRACT)

    # Chamfer5
    # the kernel refuses this chamfer: 3 mm, written as the material it takes off along each edge
    with BuildSketch(Plane(origin=(1.683013294, 8.801676915, 18.19), x_dir=(0, 0, 1), z_dir=(-1, 0, 0))) as chamfer5_piece_1:
        Polygon((1 + CHAMFER5_SIZE, 0), (1, CHAMFER5_SIZE), (1, 0), align=None)
    revolve(axis=Axis((1.683013294, 8.801676915, 18.19), (0, 1, 0)), mode=Mode.SUBTRACT)


solid = part.part
